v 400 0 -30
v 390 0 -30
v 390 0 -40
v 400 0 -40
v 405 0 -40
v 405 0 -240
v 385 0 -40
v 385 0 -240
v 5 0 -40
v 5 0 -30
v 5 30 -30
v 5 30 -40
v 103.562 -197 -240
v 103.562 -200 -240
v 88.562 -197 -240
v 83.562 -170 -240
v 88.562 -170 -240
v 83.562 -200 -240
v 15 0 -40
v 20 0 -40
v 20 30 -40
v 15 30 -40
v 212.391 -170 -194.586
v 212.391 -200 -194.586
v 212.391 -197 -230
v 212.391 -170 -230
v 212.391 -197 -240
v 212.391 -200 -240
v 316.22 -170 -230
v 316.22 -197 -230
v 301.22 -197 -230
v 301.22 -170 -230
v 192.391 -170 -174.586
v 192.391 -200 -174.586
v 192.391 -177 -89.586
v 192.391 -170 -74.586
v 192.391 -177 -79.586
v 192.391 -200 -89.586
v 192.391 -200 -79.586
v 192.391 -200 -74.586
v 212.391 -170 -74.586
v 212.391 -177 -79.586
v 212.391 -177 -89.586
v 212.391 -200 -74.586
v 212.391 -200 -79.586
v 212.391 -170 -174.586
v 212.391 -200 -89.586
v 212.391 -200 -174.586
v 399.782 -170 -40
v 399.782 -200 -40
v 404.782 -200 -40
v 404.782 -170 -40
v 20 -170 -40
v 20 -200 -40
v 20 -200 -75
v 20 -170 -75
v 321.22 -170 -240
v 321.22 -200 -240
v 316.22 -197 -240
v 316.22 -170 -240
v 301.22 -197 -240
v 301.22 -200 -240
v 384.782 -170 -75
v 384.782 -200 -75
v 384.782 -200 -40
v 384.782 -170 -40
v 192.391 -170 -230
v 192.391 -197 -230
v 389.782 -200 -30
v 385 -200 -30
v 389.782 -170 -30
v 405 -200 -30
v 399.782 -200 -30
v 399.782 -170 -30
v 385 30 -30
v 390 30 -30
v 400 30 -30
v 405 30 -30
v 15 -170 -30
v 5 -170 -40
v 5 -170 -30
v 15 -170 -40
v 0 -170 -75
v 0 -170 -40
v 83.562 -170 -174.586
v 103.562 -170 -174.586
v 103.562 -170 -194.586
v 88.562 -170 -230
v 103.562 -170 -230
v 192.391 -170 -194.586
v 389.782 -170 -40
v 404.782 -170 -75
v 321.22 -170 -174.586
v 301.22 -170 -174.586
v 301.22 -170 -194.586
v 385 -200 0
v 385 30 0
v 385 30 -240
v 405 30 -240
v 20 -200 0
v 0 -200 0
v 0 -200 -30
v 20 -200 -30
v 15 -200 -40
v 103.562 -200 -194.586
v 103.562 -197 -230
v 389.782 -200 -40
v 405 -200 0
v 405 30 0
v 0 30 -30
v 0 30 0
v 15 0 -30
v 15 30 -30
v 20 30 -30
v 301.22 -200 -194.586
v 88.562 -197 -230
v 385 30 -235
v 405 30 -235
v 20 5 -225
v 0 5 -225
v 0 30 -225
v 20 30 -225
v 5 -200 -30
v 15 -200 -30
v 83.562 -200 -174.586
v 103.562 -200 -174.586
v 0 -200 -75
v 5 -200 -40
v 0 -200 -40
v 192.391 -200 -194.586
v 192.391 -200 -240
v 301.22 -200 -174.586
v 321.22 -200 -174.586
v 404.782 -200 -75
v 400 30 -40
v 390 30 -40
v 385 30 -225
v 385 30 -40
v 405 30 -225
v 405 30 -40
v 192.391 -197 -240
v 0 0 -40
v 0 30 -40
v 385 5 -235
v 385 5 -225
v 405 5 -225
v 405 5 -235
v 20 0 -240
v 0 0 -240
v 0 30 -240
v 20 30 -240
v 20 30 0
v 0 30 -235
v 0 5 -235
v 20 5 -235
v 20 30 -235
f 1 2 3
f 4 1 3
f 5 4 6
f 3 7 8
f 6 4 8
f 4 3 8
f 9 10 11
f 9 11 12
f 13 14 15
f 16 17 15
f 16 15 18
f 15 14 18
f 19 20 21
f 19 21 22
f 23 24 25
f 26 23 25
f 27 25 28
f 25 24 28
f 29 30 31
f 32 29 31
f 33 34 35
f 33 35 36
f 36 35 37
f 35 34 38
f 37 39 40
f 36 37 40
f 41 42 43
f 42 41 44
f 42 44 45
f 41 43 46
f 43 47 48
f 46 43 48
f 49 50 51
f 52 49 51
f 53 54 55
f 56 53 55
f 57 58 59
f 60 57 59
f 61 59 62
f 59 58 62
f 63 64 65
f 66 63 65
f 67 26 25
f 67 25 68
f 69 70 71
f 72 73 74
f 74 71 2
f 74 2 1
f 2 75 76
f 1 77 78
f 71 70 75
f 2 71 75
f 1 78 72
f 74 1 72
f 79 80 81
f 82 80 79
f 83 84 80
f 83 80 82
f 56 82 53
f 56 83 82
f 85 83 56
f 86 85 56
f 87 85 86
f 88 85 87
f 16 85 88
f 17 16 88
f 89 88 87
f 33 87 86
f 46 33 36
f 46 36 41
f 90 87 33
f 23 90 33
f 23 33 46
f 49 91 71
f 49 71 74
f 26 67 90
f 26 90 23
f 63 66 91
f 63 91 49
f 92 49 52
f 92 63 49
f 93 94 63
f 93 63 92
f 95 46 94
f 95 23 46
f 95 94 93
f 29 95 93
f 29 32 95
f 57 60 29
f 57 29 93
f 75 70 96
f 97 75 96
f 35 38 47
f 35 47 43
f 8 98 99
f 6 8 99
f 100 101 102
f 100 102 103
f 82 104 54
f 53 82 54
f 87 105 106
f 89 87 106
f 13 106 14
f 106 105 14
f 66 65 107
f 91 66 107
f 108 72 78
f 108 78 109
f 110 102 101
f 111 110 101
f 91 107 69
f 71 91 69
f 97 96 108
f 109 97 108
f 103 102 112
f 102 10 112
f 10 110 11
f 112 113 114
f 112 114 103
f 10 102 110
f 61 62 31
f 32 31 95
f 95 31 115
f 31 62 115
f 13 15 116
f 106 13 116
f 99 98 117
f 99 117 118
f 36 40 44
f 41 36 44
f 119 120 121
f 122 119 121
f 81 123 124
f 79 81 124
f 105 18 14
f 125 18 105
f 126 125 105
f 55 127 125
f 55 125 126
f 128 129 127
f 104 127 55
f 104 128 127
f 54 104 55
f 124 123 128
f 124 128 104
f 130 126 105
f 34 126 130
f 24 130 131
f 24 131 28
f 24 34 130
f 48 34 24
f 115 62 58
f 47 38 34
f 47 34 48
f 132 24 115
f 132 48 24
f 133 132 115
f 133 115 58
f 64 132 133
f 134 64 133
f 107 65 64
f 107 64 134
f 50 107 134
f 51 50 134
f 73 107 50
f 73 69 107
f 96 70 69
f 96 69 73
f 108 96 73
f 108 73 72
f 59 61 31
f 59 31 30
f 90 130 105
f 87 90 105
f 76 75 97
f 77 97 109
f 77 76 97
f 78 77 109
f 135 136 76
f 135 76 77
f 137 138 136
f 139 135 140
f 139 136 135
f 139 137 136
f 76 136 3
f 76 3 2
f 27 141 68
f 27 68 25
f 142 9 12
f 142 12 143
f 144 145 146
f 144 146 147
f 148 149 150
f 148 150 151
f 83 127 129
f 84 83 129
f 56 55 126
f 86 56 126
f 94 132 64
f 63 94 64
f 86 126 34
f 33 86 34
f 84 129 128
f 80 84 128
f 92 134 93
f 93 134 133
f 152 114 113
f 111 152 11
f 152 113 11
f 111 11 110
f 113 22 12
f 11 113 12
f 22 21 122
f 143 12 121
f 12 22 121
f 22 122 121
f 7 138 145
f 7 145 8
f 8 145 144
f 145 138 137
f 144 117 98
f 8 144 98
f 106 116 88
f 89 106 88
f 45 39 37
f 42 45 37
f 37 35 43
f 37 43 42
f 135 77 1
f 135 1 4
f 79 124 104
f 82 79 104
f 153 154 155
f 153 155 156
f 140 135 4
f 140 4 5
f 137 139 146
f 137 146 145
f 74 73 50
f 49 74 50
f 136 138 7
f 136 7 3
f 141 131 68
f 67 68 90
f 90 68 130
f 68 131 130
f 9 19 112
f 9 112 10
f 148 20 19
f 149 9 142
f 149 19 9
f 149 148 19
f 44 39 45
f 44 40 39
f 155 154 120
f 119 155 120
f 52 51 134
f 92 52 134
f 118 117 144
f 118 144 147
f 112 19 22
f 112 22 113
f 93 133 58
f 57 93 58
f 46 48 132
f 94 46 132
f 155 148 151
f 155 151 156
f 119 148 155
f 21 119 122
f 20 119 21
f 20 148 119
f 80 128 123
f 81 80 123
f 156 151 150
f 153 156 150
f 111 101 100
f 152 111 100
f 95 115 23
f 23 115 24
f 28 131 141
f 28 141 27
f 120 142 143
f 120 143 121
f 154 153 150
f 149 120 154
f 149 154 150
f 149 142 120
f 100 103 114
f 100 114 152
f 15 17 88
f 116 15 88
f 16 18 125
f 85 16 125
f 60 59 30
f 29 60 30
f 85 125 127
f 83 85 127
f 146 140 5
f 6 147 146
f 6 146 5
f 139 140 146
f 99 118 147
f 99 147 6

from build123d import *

# Parameters (mm, degrees)
BOSS_EXTRUDE1_DEPTH   = 30
SKETCH2_W             = 10
SKETCH2_H             = 25
CUT_EXTRUDE1_DEPTH    = 20
SKETCH4_W             = 20
SKETCH4_H             = 30
BOSS_EXTRUDE2_DEPTH   = 200
BOSS_EXTRUDE3_DEPTH   = 30
CUT_EXTRUDE2_REACH    = 341.246
CUT_EXTRUDE2_START    = -5
SKETCH7_W             = 10
SKETCH7_H             = 27
MIRROR2_START         = -200
MIRROR2_DEPTH         = 30
MIRROR2_2_OUTLINE_W   = 10
MIRROR2_2_OUTLINE_H   = 10
MIRROR2_2_OUTLINE_W_2 = 15
MIRROR2_2_DEPTH       = 3
SKETCH8_W             = 20
SKETCH8_H             = 5
BOSS_EXTRUDE4_DEPTH   = 30
BOSS_EXTRUDE4_2_DEPTH = 30
SKETCH9_W             = 20
SKETCH9_H             = 30
BOSS_EXTRUDE5_DEPTH   = 200
BOSS_EXTRUDE6_START   = 365
SKETCH10_W            = 10
SKETCH10_H            = 5
BOSS_EXTRUDE6_DEPTH   = 20
SKETCH11_W            = 10
SKETCH11_H            = 23
CUT_EXTRUDE3_DEPTH    = 20


# Read off the part's stored shape, not the designer's step: Mirror2
with BuildPart() as part:
    # Sketch1 → Boss-Extrude1 (new body)
    with BuildSketch(Plane(origin=(0, 0, 0), x_dir=(1, 0, 0), z_dir=(0, 1, 0))):
        Polygon((15, 30), (20, 30), (20, 0), (0, 0), (0, 30), (5, 30), (5, 40), (0, 40), (0, 240), (20, 240), (20, 40), (15, 40), align=None)
    extrude(amount=BOSS_EXTRUDE1_DEPTH)

    # Sketch2 → Cut-Extrude1 (cut)
    with BuildSketch(Plane.ZY):
        with Locations((-230, 17.5)):
            Rectangle(SKETCH2_W, SKETCH2_H)
    extrude(amount=-CUT_EXTRUDE1_DEPTH, mode=Mode.SUBTRACT)

    # Sketch4 → Boss-Extrude2 (add)
    with BuildSketch(Plane.XZ):
        with Locations((10, -15)):
            Rectangle(SKETCH4_W, SKETCH4_H)
    extrude(amount=BOSS_EXTRUDE2_DEPTH)


with BuildPart() as body_2:
    # Sketch5 → Boss-Extrude3 (new body)
    with BuildSketch(Plane.XZ.offset(200)):
        Polygon((5, -30), (15, -30), (15, -40), (20, -40), (20, -75), (103.562389259, -174.585777605), (192.391233937, -174.585777605), (192.391233937, -74.585777605), (202.391233937, -74.585777605), (202.391233937, -240), (192.391233937, -240), (192.391233937, -194.585777605), (103.562389259, -194.585777605), (103.562389259, -240), (83.562389259, -240), (83.562389259, -174.585777605), (0, -75), (0, -40), (5, -40), align=None)
    extrude(amount=-BOSS_EXTRUDE3_DEPTH)

    # Cut-Extrude2: up to this face of the body (flat: up to its plane)
    cut_extrude2_end = Plane(body_2.part.faces().sort_by_distance((202.391233937, -185, -157.292888803))[0])
    # Sketch7 → Cut-Extrude2 (cut, up to the picked face)
    with BuildSketch(Plane.ZY.offset(-83.562389259).offset(CUT_EXTRUDE2_START), mode=Mode.PRIVATE) as cut_extrude2_sk1:
        with Locations((-235, -183.5)):
            Rectangle(SKETCH7_W, SKETCH7_H)
    cut_extrude2_tool1 = split(extrude(cut_extrude2_sk1.sketch, amount=-CUT_EXTRUDE2_REACH, mode=Mode.PRIVATE), bisect_by=cut_extrude2_end, keep=Keep.BOTH, mode=Mode.PRIVATE)
    add(cut_extrude2_tool1.solids().sort_by(Axis((88.562389, -183.5, -235), (1, 0, 0)))[0], mode=Mode.SUBTRACT)

    # Mirror2 outline → Mirror2 (add)
    with BuildSketch(Plane(origin=(0, 0, 0), x_dir=(1, 0, 0), z_dir=(0, 1, 0)).offset(MIRROR2_START)):
        Polygon((384.782467874, 75), (384.782467874, 40), (389.782467874, 40), (389.782467874, 30), (399.782467874, 30), (399.782467874, 40), (404.782467874, 40), (404.782467874, 75), (321.220078615, 174.585777605), (321.220078615, 240), (316.220078615, 240), (316.220078615, 230), (301.220078615, 230), (301.220078615, 194.585777605), (212.391233937, 194.585777605), (212.391233937, 230), (202.391233937, 230), (202.391233937, 74.585777605), (212.391233937, 74.585777605), (212.391233937, 174.585777605), (301.220078615, 174.585777605), align=None)
    extrude(amount=MIRROR2_DEPTH)

    # Mirror2 2 outline → Mirror2 2 (add)
    with BuildSketch(Plane(origin=(0, 0, 0), x_dir=(1, 0, 0), z_dir=(0, 1, 0)).offset(MIRROR2_START)):
        with Locations((207.391233937, 235)):
            Rectangle(MIRROR2_2_OUTLINE_W, MIRROR2_2_OUTLINE_H)
        with Locations((308.720078615, 235)):
            Rectangle(MIRROR2_2_OUTLINE_W_2, MIRROR2_2_OUTLINE_H)
    extrude(amount=MIRROR2_2_DEPTH)



with BuildPart() as body_3:
    # Sketch8 → Boss-Extrude4 (new body)
    with BuildSketch(Plane(origin=(0, 30, 0), x_dir=(1, 0, 0), z_dir=(0, 1, 0))):
        with Locations((395, 237.5)):
            Rectangle(SKETCH8_W, SKETCH8_H)
    extrude(amount=-BOSS_EXTRUDE4_DEPTH)


with BuildPart() as body_4:
    # Sketch8 → Boss-Extrude4 2 (new body)
    with BuildSketch(Plane(origin=(0, 30, 0), x_dir=(1, 0, 0), z_dir=(0, 1, 0))):
        Polygon((405, 30), (400, 30), (400, 40), (405, 40), (405, 225), (385, 225), (385, 40), (390, 40), (390, 30), (385, 30), (385, 0), (405, 0), align=None)
    extrude(amount=-BOSS_EXTRUDE4_2_DEPTH)


with BuildPart() as body_2_1:
    add(body_2.part)

    add(body_4.part)  # Boss-Extrude5 merges body 4
    # Sketch9 → Boss-Extrude5 (add)
    with BuildSketch(Plane.XZ):
        with Locations((395, -15)):
            Rectangle(SKETCH9_W, SKETCH9_H)
    extrude(amount=BOSS_EXTRUDE5_DEPTH)


    add(body_3.part)  # Boss-Extrude6 merges body 3
    # Sketch10 → Boss-Extrude6 (add)
    with BuildSketch(Plane(origin=(20, 0, 0), x_dir=(0, 0, -1), z_dir=(1, 0, 0)).offset(BOSS_EXTRUDE6_START)):
        with Locations((230, 2.5)):
            Rectangle(SKETCH10_W, SKETCH10_H)
    extrude(amount=BOSS_EXTRUDE6_DEPTH)

    # Sketch11 → Cut-Extrude3 (cut)
    with BuildSketch(Plane.ZY.offset(-192.391233937)):
        with Locations((-84.585777605, -188.5)):
            Rectangle(SKETCH11_W, SKETCH11_H)
    extrude(amount=-CUT_EXTRUDE3_DEPTH, mode=Mode.SUBTRACT)


solid = Compound([part.part, body_2_1.part])
